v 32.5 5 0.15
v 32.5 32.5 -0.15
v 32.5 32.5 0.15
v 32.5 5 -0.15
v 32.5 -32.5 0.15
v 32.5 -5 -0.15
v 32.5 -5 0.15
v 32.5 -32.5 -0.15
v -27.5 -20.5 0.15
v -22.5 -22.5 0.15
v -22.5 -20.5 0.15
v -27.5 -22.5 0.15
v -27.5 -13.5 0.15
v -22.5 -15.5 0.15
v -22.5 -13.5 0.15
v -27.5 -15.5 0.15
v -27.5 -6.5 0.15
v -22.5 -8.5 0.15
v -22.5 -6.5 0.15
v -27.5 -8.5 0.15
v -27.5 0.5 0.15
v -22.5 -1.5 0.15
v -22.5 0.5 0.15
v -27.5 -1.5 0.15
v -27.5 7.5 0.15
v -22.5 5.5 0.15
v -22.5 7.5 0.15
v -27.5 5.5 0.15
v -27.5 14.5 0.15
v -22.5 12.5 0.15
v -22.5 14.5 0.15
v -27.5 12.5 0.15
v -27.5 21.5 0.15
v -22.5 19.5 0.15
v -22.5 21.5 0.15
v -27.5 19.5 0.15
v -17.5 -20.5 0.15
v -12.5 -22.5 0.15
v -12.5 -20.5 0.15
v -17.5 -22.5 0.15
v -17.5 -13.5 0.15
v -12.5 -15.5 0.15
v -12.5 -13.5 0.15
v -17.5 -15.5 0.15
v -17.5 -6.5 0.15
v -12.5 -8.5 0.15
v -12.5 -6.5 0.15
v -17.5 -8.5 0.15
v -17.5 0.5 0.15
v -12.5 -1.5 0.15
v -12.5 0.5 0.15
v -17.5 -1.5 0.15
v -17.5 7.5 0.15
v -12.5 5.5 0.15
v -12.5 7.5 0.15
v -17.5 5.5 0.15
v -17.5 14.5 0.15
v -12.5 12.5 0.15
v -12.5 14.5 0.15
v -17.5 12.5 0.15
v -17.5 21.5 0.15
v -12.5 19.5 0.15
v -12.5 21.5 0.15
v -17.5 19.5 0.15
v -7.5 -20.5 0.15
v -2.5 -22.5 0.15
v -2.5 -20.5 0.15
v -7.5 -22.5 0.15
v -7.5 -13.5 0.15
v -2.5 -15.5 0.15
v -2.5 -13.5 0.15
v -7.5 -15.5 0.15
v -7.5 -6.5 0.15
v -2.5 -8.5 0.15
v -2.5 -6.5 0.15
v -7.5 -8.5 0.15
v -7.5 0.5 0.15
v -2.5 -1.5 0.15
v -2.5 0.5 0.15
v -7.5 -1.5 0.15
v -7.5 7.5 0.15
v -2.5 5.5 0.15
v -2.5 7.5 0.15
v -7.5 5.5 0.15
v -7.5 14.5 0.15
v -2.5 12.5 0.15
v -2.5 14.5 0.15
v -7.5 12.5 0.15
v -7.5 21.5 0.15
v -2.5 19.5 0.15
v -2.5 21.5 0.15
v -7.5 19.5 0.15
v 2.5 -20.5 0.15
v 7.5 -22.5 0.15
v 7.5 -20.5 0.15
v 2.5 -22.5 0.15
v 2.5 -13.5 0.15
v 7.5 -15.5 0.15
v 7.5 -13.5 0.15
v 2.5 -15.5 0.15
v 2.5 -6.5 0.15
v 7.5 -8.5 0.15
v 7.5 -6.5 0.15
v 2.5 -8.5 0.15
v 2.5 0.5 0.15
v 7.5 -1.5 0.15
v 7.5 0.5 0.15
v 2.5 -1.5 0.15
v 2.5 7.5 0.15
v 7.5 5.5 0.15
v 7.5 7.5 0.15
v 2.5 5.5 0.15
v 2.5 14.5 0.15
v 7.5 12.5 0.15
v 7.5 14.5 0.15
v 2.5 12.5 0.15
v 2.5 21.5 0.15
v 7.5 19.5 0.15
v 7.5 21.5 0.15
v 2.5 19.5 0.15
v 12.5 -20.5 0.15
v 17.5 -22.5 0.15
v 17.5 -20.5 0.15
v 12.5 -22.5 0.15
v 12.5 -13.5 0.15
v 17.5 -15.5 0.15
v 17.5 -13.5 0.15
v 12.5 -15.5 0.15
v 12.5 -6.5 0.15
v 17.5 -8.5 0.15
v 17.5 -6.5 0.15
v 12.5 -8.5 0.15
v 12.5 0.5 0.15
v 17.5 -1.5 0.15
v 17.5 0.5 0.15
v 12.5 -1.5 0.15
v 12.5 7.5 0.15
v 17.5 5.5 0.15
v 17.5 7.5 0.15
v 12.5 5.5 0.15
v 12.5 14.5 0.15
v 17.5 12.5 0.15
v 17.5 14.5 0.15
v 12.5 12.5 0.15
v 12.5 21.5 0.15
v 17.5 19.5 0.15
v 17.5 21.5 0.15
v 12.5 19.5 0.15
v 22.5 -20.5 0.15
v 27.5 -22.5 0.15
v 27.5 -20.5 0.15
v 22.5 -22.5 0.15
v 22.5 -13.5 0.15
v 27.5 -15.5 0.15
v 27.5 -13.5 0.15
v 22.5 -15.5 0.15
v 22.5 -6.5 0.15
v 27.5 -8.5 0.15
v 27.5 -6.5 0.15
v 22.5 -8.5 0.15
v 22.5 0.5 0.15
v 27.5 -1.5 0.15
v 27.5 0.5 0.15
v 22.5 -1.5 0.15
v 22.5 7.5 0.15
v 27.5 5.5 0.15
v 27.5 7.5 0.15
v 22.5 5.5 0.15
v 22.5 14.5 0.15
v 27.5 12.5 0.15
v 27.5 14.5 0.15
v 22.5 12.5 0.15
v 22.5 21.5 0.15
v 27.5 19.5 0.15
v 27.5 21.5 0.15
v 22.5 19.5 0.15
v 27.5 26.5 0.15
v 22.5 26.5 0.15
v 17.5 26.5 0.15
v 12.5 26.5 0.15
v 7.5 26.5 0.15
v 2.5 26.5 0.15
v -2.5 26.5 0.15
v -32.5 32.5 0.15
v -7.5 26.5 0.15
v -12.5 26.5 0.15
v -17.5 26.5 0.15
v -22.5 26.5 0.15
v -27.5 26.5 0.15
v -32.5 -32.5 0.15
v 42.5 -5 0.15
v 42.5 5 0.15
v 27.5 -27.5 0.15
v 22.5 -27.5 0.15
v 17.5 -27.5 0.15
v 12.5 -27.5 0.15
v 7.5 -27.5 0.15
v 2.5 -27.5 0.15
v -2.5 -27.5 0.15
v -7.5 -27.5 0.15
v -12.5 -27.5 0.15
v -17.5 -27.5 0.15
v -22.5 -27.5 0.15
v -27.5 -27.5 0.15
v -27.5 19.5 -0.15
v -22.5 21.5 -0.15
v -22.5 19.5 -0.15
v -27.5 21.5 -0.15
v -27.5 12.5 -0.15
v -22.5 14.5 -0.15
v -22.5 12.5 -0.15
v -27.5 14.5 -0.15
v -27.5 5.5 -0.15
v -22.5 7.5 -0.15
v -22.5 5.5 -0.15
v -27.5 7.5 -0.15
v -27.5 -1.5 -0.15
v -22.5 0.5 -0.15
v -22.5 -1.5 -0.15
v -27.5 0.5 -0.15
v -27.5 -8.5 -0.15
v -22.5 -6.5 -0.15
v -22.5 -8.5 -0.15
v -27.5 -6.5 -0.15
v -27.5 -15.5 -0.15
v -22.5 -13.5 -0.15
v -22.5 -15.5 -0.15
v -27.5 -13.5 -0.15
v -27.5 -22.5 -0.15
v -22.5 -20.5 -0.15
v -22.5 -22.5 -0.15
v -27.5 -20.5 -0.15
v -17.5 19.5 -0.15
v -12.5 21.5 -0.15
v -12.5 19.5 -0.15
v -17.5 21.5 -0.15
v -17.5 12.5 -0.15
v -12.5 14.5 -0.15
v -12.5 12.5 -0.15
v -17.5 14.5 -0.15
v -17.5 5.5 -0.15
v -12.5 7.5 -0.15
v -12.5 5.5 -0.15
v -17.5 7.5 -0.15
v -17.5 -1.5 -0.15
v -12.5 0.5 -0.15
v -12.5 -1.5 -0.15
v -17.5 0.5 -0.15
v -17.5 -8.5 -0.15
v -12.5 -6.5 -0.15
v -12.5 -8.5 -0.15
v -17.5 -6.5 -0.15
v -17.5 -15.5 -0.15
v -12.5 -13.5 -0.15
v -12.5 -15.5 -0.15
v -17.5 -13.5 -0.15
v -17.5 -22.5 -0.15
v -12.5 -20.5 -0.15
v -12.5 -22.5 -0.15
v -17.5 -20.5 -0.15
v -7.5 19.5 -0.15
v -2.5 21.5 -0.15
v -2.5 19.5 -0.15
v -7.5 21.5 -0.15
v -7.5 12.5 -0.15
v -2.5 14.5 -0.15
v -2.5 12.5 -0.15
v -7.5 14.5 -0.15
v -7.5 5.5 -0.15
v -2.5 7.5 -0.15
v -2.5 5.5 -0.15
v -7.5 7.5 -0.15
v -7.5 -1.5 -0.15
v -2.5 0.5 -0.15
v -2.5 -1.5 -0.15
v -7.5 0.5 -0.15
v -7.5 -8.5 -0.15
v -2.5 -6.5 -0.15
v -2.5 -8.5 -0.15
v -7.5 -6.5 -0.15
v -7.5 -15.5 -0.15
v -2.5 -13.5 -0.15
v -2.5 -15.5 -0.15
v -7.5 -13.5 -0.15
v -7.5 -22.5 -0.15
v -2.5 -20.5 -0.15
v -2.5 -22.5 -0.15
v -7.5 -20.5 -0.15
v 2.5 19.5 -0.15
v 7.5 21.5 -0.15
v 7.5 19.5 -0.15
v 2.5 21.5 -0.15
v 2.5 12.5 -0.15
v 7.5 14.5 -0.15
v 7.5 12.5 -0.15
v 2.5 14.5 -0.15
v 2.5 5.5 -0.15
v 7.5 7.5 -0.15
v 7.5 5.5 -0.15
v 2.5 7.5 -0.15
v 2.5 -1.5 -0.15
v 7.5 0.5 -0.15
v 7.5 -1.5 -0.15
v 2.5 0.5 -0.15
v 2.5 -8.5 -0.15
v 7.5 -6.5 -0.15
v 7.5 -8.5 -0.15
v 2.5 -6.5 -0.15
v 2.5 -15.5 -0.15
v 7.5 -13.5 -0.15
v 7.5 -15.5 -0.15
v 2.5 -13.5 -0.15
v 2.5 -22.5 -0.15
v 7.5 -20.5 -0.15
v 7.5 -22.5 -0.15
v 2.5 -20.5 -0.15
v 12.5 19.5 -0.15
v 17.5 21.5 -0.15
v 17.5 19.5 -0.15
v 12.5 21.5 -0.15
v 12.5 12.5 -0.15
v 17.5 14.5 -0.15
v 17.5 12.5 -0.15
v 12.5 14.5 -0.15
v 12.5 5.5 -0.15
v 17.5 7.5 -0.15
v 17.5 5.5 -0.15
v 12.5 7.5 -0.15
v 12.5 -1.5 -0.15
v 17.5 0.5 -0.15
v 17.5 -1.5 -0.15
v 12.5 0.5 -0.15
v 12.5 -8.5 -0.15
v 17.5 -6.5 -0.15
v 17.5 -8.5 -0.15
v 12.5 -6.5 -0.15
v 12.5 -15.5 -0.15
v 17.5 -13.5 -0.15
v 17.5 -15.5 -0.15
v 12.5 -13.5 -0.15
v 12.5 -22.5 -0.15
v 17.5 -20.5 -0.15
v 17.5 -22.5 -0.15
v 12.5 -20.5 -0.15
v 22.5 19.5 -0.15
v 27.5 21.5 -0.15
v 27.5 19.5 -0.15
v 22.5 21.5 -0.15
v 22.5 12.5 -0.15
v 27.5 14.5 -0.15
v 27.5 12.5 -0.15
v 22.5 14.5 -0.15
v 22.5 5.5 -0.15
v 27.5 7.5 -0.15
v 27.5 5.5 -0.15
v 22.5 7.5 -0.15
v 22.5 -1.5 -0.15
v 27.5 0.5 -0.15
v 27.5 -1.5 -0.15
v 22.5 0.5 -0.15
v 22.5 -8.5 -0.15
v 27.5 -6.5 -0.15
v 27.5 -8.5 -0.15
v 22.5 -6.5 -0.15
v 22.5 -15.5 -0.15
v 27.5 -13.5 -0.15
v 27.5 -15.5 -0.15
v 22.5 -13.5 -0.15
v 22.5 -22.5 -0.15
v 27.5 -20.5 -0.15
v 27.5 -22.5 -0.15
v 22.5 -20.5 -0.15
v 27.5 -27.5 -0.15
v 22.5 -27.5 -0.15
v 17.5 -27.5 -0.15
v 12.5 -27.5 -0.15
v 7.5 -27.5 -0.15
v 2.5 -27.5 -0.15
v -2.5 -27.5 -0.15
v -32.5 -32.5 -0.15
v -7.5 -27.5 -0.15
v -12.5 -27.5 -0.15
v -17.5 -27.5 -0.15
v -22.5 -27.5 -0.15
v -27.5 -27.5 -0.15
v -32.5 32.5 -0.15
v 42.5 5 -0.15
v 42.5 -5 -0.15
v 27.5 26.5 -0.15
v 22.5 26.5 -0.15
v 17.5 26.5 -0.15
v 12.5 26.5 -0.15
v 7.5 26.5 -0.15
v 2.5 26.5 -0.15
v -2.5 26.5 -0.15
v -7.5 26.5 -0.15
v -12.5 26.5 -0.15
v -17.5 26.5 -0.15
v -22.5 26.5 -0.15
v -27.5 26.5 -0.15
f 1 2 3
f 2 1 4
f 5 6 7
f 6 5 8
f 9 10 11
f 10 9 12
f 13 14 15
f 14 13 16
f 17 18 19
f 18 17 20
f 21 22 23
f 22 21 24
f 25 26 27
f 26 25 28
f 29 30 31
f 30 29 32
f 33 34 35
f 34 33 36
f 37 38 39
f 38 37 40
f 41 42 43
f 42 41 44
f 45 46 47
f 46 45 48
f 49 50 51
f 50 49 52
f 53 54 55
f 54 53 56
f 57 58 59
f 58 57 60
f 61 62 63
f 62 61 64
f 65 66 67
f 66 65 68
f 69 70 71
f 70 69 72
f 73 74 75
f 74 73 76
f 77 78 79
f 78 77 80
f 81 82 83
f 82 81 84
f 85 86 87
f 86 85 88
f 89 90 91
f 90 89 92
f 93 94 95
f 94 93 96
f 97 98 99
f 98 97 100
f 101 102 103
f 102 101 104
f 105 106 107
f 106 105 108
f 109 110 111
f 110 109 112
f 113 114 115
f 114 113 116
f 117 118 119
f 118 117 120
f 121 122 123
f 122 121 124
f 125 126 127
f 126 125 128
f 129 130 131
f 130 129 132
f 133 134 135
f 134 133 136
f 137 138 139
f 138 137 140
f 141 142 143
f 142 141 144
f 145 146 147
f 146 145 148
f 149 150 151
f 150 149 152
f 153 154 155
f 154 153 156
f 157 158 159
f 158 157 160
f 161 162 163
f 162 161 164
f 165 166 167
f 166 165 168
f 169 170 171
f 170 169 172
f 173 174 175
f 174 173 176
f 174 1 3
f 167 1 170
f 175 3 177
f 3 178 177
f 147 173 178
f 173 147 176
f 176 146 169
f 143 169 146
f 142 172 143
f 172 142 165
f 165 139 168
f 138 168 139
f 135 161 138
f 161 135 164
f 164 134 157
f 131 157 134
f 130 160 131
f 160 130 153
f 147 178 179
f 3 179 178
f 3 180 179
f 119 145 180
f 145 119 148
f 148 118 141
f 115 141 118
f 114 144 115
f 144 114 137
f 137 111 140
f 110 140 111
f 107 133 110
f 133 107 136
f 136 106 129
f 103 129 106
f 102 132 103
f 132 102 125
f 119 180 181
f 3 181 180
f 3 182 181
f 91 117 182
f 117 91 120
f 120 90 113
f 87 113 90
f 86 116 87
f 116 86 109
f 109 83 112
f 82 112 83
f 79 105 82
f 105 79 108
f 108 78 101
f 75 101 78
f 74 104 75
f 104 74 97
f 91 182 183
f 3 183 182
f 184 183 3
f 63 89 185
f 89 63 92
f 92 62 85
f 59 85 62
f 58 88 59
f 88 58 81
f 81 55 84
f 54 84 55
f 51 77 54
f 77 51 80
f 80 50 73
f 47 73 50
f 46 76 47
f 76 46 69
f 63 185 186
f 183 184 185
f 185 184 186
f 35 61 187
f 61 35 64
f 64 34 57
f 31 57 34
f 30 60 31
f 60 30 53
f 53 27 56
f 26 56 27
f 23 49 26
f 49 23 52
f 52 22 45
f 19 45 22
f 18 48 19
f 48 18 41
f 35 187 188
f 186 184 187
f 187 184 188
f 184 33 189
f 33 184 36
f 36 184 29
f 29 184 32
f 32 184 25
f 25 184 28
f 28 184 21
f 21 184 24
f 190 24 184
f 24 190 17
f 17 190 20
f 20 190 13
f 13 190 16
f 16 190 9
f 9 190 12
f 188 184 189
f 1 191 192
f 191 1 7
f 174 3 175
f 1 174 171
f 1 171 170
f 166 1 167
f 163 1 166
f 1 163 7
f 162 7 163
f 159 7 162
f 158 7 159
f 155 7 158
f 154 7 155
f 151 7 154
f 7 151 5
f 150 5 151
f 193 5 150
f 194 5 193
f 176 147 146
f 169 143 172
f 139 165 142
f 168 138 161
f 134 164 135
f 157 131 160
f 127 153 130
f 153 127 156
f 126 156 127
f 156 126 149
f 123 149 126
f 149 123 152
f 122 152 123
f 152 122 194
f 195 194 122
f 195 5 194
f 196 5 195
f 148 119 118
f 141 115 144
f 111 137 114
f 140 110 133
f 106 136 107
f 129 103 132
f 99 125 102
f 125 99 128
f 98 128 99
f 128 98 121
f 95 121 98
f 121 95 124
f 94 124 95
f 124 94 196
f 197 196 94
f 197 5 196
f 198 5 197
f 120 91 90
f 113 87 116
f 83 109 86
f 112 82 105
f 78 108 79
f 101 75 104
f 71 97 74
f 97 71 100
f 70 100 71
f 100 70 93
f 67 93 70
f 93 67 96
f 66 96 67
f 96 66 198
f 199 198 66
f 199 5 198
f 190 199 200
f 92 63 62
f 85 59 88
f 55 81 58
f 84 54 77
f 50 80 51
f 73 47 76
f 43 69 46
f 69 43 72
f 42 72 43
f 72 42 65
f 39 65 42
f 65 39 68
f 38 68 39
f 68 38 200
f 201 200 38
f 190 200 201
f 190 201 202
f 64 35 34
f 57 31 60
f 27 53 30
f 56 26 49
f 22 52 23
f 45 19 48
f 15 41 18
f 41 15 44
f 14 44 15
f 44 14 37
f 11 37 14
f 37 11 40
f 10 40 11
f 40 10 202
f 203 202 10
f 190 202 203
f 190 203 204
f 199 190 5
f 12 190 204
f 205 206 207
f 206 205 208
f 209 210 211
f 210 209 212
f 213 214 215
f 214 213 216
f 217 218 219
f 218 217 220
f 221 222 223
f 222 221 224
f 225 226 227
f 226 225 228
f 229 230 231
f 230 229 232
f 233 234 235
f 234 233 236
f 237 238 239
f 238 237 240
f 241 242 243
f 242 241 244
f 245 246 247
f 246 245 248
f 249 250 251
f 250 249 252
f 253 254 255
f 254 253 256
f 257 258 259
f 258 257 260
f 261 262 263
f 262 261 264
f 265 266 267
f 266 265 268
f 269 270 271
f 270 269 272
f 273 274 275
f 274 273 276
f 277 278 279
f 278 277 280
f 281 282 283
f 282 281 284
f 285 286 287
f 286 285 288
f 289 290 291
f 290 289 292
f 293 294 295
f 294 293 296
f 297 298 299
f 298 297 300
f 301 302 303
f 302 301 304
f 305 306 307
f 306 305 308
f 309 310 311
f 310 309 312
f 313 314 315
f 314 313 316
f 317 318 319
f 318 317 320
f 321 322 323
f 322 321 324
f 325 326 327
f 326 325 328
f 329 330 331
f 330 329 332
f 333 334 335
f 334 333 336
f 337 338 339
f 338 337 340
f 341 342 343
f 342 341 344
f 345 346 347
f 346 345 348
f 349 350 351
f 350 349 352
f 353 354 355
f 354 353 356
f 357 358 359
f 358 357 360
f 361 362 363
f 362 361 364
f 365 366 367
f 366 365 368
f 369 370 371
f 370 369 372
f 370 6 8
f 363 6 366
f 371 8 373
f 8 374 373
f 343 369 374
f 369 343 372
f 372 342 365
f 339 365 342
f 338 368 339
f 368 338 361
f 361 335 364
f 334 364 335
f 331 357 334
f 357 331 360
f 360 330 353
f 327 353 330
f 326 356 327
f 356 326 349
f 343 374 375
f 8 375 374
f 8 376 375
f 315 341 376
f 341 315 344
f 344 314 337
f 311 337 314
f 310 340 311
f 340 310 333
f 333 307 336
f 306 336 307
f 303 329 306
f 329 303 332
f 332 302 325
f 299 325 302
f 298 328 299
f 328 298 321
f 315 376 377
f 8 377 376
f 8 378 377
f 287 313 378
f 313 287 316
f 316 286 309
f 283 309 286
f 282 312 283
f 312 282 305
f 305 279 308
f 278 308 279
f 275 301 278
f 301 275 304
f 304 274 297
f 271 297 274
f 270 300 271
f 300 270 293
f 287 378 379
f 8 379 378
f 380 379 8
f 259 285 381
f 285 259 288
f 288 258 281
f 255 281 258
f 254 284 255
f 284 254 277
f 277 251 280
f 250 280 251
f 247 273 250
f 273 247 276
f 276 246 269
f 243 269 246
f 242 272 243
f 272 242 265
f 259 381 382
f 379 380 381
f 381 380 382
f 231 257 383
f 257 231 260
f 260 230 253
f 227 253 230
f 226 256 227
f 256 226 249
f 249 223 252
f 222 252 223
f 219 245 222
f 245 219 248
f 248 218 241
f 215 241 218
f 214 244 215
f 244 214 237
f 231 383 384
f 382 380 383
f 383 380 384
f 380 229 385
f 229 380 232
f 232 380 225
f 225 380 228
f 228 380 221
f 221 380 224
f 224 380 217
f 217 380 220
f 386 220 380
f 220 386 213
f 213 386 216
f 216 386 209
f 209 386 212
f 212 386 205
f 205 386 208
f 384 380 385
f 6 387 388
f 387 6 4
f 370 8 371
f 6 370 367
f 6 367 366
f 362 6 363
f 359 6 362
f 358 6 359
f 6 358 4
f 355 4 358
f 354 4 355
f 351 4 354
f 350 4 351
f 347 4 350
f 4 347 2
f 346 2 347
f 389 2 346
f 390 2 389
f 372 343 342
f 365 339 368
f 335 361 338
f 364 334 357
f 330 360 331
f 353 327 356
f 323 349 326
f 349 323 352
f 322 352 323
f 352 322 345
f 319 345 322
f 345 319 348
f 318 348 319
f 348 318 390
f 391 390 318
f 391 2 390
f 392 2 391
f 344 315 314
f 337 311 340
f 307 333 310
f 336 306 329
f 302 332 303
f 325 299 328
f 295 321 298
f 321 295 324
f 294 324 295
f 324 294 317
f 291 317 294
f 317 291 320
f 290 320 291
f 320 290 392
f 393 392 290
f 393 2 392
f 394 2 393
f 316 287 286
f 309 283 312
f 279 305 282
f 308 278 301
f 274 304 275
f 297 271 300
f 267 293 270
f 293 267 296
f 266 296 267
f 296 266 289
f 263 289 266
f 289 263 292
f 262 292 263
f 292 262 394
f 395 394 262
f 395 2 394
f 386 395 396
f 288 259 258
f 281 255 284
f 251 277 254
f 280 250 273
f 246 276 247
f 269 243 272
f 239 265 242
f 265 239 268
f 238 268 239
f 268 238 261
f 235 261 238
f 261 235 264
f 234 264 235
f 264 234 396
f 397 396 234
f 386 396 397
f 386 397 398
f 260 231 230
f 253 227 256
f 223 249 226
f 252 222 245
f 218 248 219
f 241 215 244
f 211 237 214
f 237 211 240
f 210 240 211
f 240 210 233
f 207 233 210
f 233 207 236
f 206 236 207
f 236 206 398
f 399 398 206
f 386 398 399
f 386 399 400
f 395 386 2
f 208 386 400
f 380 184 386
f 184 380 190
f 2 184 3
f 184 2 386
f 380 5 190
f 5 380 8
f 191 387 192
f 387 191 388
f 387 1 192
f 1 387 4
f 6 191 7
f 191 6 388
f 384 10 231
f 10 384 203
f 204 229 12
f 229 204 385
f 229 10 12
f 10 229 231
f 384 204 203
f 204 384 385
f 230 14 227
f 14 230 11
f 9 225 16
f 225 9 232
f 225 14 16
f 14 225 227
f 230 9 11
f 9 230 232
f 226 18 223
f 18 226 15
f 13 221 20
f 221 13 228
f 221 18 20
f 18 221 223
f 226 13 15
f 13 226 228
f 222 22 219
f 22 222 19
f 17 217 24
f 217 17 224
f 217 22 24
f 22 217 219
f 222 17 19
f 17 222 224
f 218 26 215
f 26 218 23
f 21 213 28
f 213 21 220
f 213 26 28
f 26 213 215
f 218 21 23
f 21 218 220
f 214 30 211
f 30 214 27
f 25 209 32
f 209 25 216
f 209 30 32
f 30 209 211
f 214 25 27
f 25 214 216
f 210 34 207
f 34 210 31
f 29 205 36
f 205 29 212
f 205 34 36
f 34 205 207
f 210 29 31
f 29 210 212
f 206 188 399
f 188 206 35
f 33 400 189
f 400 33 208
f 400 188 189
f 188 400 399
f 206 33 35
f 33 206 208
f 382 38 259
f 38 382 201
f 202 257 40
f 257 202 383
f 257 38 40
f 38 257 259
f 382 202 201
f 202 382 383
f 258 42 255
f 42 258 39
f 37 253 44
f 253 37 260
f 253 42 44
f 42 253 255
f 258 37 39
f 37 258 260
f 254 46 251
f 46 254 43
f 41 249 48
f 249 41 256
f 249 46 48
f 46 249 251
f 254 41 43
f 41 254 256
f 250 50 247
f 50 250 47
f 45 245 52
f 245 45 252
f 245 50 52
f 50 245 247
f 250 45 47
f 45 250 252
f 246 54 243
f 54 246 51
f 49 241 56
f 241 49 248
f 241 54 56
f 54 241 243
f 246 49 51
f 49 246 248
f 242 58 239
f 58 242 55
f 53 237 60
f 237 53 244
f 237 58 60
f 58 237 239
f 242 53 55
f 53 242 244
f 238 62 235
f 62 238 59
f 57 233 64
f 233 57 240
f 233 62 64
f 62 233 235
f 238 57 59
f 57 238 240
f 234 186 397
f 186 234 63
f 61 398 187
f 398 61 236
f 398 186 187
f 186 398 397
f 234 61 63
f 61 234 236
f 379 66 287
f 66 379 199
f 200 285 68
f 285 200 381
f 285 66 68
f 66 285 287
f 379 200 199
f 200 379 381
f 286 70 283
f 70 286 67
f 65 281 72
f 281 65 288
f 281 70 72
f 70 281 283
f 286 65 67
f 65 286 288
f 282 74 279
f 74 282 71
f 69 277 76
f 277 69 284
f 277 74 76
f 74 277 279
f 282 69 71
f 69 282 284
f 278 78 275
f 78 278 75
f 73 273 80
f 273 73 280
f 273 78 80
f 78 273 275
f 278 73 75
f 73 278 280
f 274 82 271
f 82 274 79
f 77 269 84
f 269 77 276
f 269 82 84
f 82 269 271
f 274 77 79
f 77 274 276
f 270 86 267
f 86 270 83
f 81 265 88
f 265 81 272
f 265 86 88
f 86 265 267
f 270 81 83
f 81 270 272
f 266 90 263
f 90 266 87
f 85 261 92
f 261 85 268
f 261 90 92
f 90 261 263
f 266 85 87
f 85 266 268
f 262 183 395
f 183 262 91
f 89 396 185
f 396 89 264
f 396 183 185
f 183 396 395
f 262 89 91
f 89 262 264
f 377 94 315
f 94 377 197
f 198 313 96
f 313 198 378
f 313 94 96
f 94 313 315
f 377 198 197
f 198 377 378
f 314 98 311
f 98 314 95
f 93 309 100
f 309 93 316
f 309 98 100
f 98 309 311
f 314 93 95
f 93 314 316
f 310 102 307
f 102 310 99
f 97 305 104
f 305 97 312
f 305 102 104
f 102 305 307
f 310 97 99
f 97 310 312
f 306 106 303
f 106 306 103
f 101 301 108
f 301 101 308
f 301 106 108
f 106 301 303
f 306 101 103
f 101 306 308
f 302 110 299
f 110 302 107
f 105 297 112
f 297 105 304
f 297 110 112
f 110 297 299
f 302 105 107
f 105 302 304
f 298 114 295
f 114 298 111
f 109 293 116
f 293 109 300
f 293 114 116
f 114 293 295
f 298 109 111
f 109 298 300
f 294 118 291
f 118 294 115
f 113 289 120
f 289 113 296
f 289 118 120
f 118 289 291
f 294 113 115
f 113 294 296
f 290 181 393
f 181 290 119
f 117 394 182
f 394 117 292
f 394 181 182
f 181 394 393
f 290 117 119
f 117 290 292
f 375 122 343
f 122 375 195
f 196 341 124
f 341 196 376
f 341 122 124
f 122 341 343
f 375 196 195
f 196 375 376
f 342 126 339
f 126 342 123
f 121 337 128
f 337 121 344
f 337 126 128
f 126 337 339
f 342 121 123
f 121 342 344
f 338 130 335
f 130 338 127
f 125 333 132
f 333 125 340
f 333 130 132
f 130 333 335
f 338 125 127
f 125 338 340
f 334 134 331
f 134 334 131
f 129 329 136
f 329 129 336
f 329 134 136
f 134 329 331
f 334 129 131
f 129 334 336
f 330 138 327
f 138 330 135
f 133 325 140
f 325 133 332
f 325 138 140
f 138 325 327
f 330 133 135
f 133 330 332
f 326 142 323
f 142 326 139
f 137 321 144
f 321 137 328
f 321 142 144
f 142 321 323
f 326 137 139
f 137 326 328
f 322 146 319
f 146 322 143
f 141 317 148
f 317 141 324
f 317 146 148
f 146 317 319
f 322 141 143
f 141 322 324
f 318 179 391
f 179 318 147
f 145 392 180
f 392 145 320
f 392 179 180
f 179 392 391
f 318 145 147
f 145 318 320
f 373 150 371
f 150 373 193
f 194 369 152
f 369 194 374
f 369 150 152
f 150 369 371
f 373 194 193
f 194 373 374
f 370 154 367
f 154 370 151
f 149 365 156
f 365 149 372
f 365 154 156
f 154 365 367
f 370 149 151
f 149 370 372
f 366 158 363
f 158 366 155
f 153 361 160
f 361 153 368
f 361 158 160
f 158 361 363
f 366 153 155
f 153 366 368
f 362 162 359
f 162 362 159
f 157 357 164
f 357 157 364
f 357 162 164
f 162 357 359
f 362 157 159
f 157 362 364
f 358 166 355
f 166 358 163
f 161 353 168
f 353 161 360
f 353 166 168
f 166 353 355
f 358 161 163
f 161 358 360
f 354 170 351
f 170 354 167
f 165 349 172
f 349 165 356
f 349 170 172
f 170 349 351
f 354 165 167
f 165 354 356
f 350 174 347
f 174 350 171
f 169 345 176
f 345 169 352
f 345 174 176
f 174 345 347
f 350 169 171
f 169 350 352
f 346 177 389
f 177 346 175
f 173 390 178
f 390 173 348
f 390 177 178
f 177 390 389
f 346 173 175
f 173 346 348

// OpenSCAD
dicke_size=0.3;

module schleuse(size=65) {
    cube([size, size, dicke_size], center=true);
    translate([size/2,0,0]) cube([20,10, dicke_size], center=true);
}


module loch(size=5) {
    cube([size, size, dicke_size], center=true);
}



module loescher(){
  for(x = [-25 : 10: 25]) {
    for(y = [-25 : 7: 25]){
      translate([x,y,0]) loch();}
      
  }
}


// main
difference() {
   schleuse();
   loescher();
}
